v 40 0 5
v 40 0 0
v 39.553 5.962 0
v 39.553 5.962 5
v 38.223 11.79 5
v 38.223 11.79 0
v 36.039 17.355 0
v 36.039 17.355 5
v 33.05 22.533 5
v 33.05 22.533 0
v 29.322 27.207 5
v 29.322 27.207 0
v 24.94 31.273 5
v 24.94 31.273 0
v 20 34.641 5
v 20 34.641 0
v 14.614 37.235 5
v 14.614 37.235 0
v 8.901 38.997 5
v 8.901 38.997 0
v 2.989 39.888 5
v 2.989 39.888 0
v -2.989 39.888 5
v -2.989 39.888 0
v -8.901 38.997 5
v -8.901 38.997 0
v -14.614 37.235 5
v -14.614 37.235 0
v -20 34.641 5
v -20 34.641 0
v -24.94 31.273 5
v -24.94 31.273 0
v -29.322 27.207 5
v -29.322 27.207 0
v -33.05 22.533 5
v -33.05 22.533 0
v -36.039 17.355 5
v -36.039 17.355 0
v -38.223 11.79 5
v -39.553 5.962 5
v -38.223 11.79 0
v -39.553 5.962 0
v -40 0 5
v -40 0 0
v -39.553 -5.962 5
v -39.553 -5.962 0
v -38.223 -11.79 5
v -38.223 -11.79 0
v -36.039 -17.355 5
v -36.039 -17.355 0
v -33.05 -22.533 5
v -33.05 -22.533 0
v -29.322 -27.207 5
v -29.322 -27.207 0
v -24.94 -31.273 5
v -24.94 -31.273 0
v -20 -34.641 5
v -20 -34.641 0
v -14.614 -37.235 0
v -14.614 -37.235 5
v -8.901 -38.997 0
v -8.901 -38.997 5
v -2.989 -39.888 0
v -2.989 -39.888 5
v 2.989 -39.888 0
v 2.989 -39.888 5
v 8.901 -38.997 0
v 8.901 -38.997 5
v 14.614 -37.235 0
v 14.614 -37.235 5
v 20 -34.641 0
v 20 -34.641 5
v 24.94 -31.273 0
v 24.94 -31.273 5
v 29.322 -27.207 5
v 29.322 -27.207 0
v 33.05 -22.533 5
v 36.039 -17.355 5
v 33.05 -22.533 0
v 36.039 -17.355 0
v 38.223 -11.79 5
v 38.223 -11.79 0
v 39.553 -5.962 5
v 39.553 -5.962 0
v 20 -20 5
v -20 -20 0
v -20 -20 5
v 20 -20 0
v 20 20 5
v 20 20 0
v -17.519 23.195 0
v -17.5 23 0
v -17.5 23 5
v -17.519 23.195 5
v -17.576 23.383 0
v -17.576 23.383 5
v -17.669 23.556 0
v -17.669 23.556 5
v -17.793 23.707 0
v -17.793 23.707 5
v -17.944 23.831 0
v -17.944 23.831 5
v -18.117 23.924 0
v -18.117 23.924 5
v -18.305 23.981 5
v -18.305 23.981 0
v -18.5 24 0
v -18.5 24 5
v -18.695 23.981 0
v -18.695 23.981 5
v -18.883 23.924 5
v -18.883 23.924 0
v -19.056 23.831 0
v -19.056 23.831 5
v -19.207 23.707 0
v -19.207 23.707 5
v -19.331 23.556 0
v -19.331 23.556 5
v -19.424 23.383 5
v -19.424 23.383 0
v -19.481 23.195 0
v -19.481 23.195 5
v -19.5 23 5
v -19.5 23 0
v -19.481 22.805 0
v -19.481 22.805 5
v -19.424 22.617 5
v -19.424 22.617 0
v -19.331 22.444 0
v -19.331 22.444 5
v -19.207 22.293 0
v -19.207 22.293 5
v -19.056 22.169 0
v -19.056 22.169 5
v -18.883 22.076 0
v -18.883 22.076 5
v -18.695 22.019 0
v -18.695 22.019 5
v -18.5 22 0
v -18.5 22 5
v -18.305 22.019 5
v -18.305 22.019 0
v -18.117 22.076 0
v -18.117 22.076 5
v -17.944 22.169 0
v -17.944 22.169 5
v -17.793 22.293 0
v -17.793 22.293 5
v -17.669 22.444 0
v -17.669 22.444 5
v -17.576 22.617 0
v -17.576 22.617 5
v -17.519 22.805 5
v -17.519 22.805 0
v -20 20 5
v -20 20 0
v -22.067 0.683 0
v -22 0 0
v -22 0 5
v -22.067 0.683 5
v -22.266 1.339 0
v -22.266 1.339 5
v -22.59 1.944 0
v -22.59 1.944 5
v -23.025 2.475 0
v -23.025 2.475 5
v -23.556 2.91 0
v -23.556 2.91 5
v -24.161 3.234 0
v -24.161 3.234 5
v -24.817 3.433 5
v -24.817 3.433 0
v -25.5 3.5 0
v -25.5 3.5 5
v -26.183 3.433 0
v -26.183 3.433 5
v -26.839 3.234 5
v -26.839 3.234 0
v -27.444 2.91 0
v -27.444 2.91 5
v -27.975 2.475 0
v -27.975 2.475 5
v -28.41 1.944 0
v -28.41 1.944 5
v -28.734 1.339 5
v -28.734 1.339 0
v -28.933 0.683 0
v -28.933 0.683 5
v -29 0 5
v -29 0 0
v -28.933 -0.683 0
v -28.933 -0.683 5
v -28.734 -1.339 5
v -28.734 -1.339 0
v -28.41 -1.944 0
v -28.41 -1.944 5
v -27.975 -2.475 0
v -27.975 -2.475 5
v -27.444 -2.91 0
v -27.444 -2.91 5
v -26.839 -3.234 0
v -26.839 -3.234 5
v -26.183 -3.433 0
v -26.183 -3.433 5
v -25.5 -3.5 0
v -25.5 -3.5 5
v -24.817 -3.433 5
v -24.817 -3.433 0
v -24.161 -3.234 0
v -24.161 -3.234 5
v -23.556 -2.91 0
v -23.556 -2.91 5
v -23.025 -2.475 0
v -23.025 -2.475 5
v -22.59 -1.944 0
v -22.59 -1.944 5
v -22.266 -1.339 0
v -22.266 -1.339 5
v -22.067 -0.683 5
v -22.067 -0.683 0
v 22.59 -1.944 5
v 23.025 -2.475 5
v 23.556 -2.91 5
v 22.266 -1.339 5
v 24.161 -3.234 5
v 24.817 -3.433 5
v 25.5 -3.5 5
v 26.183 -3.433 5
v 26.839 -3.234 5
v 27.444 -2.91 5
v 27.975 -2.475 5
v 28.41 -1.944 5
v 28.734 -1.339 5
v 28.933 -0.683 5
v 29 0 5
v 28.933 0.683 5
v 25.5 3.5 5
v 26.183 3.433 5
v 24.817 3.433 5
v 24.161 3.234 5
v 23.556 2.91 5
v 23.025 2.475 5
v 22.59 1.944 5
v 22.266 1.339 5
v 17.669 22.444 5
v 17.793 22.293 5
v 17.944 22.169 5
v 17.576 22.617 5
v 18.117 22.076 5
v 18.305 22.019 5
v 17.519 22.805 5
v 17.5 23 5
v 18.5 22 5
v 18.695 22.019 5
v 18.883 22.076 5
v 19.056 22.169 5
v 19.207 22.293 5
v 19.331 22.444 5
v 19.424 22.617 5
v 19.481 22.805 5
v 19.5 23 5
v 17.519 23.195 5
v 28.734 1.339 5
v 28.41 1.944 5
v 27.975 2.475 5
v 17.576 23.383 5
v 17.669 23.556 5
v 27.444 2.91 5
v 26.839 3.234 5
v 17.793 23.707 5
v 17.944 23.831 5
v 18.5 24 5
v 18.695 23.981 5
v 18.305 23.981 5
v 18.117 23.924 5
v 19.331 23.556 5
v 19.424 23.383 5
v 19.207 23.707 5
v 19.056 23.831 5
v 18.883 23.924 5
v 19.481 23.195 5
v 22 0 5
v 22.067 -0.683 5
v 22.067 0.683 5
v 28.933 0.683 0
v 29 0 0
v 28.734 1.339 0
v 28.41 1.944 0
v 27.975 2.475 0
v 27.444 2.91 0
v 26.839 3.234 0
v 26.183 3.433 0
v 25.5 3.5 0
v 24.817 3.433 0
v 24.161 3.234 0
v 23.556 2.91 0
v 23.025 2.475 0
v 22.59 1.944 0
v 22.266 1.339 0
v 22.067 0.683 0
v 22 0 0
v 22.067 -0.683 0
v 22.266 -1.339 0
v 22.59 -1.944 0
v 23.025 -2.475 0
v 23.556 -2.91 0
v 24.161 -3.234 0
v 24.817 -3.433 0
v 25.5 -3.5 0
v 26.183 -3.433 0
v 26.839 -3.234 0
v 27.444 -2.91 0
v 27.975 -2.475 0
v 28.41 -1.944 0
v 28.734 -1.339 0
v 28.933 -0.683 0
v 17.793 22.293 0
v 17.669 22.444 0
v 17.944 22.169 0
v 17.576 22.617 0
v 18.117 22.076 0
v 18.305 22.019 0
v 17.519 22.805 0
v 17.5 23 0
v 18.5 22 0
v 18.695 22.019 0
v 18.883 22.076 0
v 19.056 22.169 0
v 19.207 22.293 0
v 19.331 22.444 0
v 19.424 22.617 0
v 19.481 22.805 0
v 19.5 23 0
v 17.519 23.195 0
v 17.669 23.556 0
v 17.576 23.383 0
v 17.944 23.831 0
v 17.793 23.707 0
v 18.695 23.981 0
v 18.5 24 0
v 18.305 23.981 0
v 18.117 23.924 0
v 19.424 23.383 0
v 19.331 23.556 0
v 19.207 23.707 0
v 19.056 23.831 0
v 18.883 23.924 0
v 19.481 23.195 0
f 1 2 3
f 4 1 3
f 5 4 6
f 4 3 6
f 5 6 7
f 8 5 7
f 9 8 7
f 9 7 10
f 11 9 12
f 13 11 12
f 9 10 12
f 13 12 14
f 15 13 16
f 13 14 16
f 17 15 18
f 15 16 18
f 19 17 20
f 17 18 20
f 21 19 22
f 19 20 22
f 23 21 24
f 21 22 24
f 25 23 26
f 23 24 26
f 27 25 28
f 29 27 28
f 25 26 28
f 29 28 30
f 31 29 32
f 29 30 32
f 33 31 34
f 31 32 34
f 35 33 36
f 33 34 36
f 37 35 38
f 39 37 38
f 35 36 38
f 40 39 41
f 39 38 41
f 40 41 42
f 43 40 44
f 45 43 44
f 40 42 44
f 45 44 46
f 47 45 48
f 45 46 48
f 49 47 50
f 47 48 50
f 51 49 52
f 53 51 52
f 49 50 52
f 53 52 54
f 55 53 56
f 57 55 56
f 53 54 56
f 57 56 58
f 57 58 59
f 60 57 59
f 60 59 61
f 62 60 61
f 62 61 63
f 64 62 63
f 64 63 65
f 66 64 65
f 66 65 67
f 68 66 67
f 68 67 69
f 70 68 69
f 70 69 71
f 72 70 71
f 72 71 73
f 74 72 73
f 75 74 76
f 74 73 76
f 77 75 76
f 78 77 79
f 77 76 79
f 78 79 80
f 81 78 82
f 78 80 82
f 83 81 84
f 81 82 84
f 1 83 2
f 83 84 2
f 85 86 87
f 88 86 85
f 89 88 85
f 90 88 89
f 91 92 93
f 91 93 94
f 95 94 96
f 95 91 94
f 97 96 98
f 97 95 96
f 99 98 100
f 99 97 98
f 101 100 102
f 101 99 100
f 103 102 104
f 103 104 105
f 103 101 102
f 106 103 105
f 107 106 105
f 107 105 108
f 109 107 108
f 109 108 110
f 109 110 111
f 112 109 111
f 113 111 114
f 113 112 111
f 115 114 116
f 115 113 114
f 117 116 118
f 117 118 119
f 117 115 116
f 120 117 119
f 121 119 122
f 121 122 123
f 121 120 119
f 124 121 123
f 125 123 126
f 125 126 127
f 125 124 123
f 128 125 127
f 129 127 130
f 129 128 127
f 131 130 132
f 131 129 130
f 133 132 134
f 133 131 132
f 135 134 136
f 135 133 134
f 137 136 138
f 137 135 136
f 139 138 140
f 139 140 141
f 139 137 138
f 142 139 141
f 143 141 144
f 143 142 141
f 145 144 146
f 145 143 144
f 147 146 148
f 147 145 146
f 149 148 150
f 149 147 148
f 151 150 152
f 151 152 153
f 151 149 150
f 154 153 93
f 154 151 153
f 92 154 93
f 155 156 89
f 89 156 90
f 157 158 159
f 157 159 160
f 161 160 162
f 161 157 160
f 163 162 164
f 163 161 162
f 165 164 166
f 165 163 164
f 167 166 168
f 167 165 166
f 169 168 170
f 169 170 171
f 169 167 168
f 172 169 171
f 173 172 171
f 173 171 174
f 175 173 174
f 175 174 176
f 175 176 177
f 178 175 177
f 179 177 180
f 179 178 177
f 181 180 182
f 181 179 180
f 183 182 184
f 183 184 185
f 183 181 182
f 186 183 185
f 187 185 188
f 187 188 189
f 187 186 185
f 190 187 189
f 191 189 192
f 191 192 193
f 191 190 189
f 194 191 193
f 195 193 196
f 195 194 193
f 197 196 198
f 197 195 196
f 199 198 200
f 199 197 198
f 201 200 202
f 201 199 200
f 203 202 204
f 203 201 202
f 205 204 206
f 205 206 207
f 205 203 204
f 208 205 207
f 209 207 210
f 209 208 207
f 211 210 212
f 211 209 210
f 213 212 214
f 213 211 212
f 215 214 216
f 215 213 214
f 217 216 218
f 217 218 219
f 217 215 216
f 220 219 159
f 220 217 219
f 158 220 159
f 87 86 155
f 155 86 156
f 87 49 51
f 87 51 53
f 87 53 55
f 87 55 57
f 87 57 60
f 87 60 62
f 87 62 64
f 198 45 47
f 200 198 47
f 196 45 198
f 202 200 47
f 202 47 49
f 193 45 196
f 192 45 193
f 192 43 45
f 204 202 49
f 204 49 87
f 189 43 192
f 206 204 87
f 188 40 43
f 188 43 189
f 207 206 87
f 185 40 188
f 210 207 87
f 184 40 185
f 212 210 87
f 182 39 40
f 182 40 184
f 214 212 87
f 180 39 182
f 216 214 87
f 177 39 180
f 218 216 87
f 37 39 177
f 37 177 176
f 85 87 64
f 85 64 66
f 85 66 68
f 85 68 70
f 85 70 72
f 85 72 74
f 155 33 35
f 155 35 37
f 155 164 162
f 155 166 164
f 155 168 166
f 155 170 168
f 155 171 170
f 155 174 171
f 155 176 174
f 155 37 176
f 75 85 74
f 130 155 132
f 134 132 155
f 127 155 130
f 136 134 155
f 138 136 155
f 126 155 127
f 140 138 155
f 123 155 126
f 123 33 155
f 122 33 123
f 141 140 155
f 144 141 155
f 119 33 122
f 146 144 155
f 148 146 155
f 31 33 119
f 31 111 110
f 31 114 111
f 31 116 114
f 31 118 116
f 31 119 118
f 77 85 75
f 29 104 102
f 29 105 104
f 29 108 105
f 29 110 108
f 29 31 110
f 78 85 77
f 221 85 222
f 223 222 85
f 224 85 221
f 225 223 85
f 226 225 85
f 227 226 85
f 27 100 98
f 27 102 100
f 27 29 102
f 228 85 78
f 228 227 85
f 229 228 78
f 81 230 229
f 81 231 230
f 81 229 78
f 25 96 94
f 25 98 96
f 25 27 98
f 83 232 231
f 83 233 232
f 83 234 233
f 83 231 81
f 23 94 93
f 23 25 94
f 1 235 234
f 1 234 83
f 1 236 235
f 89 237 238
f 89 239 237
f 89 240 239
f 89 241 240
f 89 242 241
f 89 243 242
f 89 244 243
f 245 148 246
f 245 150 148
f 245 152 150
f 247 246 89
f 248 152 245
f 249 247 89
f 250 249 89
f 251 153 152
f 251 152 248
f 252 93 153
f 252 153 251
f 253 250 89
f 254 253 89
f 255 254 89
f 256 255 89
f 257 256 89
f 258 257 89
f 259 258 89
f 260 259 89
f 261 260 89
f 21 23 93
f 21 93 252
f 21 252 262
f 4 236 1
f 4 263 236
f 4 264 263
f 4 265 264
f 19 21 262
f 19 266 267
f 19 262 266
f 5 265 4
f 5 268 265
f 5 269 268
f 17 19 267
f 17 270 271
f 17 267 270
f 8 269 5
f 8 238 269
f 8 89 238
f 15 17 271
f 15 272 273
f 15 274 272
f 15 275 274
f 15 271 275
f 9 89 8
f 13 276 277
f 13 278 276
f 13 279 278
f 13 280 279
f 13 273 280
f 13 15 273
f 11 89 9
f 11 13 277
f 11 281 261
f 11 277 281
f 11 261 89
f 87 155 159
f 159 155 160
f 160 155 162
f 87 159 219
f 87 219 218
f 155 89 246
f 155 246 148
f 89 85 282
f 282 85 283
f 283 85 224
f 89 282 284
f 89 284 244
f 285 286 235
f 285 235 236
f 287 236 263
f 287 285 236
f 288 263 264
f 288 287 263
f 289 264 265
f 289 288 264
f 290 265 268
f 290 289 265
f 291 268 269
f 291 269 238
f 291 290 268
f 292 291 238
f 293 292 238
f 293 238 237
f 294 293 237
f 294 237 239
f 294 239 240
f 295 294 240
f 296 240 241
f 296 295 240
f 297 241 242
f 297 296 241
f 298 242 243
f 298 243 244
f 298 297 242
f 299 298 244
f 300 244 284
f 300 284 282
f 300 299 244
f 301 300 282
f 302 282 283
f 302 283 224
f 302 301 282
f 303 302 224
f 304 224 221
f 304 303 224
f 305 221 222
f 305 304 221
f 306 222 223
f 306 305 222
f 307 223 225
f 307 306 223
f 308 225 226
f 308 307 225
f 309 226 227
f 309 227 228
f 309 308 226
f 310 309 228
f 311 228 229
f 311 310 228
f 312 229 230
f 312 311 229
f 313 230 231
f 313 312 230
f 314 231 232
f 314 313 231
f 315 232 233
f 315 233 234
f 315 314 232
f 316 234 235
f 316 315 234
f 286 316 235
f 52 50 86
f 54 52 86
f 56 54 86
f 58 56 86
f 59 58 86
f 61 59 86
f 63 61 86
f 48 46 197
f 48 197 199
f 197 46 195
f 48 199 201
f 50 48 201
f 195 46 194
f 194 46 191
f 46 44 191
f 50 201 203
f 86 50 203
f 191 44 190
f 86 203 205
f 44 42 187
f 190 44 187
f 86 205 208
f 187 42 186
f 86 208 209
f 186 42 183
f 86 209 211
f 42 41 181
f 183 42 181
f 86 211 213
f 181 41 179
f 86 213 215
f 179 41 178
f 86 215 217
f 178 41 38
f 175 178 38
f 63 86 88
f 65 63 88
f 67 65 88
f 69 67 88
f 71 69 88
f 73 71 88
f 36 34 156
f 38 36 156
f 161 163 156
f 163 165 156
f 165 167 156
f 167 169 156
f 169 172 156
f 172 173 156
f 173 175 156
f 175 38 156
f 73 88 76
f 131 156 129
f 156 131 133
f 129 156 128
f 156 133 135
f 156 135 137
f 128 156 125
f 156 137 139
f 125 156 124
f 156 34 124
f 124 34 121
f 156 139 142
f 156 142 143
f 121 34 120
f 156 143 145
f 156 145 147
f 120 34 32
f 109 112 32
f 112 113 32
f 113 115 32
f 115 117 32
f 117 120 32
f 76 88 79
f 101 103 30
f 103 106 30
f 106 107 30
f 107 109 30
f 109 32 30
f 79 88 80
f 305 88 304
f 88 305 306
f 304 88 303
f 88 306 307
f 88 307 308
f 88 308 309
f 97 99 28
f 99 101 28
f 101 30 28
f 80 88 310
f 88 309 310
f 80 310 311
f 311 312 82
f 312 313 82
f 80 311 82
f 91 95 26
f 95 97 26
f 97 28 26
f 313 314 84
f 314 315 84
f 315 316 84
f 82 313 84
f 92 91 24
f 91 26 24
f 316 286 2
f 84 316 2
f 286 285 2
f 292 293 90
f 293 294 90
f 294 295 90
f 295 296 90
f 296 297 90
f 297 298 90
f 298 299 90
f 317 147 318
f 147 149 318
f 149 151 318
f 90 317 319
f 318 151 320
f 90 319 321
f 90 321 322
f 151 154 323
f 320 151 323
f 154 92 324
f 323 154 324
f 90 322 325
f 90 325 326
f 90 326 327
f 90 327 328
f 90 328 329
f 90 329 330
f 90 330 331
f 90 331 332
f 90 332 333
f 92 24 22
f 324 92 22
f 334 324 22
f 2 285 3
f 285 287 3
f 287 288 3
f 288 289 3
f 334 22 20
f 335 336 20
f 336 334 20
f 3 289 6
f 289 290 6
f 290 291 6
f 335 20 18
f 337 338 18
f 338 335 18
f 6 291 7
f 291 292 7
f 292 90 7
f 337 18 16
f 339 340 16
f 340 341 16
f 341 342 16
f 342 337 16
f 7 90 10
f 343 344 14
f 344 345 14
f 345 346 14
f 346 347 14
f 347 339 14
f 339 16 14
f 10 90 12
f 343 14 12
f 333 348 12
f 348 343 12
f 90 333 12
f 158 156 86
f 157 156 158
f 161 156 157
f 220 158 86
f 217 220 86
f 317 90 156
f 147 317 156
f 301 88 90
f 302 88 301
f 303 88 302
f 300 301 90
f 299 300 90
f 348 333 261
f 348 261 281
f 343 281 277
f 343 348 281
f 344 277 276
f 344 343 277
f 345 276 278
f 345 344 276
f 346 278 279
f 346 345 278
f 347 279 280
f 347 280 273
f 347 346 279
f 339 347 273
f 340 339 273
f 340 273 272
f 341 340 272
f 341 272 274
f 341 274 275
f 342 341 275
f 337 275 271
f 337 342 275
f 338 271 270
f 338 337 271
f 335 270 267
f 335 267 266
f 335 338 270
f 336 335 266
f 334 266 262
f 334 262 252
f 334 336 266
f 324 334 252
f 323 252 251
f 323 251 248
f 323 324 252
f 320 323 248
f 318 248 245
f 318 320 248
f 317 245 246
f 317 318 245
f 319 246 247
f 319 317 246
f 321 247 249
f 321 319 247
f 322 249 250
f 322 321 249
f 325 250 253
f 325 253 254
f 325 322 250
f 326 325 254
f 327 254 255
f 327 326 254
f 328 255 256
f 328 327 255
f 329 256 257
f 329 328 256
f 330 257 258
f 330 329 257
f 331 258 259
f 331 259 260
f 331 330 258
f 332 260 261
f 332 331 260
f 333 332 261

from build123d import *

# Parameters (mm, degrees)
F0_R     = 40
F0_R_2   = 3.5
F0_R_3   = 1
F0_W     = 40
F0_H     = 40
F1_DEPTH = 5


with BuildPart() as f1:
    # F0 (on Top) → F1 (new body)
    with BuildSketch(Plane.XY):
        Circle(F0_R)
        with Locations((-25.5, 0)):
            Circle(F0_R_2, mode=Mode.SUBTRACT)
        with Locations((-18.5, 23)):
            Circle(F0_R_3, mode=Mode.SUBTRACT)
        Rectangle(F0_W, F0_H, mode=Mode.SUBTRACT)
        with Locations((25.5, 0)):
            Circle(F0_R_2, mode=Mode.SUBTRACT)
        with Locations((18.5, 23)):
            Circle(F0_R_3, mode=Mode.SUBTRACT)
    extrude(amount=F1_DEPTH)


solid = f1.part
